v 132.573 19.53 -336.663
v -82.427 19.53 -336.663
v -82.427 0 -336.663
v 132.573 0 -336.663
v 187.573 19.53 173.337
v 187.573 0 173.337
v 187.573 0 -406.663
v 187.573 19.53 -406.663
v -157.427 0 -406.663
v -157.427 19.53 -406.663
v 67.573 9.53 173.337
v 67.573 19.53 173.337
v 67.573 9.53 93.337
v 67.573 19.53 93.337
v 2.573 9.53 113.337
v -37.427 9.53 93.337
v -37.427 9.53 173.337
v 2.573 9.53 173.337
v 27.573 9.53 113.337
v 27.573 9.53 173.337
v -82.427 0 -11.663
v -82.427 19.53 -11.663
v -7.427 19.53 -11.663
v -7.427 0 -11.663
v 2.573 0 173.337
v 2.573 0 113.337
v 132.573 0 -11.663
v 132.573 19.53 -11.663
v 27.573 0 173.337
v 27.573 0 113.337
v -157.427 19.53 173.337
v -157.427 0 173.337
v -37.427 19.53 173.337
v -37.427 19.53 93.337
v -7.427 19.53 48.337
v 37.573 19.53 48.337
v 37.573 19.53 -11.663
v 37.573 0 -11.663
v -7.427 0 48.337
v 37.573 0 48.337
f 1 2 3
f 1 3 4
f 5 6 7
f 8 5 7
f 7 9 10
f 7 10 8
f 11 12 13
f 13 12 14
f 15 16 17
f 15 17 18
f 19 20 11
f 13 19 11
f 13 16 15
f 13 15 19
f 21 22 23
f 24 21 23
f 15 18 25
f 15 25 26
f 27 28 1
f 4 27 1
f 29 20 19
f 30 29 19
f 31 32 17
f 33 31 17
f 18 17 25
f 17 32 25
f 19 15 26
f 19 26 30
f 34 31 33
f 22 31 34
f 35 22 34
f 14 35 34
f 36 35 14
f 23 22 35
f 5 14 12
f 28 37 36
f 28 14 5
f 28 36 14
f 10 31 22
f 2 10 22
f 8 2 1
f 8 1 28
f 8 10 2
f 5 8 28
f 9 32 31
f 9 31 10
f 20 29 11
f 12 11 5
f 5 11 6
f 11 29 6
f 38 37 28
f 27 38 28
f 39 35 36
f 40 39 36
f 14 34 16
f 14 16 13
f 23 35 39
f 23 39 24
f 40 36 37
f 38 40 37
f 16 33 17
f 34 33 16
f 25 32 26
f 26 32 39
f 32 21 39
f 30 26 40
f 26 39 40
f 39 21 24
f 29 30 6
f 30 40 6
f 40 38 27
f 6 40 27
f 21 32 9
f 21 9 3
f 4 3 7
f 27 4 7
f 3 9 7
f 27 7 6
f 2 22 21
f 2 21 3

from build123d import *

# Parameters (mm, degrees)
SKETCH1_W                      = 345
SKETCH1_H                      = 580
BOSS_EXTRUDE1_DEPTH            = 19.53
CUT_EXTRUDE1_REACH             = 450.263
SKETCH2_W                      = 215
SKETCH2_H                      = 325
CUT_EXTRUDE1_DIRECTION_2_DEPTH = 449.2627239
SKETCH3_W                      = 45
SKETCH3_H                      = 60
CUT_EXTRUDE2_DEPTH             = 19.53
SKETCH4_W                      = 105
SKETCH4_H                      = 80
CUT_EXTRUDE3_DEPTH             = 10
SKETCH5_W                      = 25
SKETCH5_H                      = 60
CUT_EXTRUDE4_DEPTH             = 10


with BuildPart() as part:
    # Sketch1 → Boss-Extrude1 (new body)
    with BuildSketch(Plane(origin=(0, 0, 0), x_dir=(1, 0, 0), z_dir=(0, 1, 0))):
        with Locations((15.072815534, 116.662621359)):
            Rectangle(SKETCH1_W, SKETCH1_H)
    extrude(amount=BOSS_EXTRUDE1_DEPTH)

    # Sketch2 → Cut-Extrude1 (cut, up to next)
    with BuildSketch(Plane(origin=(0, 19.53, 0), x_dir=(1, 0, 0), z_dir=(0, 1, 0)), mode=Mode.PRIVATE) as cut_extrude1_sk1:
        with Locations((25.072815534, 174.162621359)):
            Rectangle(SKETCH2_W, SKETCH2_H)
    cut_extrude1_tool1 = extrude(cut_extrude1_sk1.sketch, amount=-CUT_EXTRUDE1_REACH, mode=Mode.PRIVATE) & part.part
    add(cut_extrude1_tool1.solids().sort_by_distance((25.072816, 19.53, -174.162621))[0], mode=Mode.SUBTRACT)

    # Sketch2 → Cut-Extrude1 direction 2 (cut)
    with BuildSketch(Plane(origin=(0, 19.53, 0), x_dir=(1, 0, 0), z_dir=(0, 1, 0))):
        with Locations((25.072815534, 174.162621359)):
            Rectangle(SKETCH2_W, SKETCH2_H)
    extrude(amount=CUT_EXTRUDE1_DIRECTION_2_DEPTH, mode=Mode.SUBTRACT)

    # Sketch3 → Cut-Extrude2 (cut)
    with BuildSketch(Plane(origin=(0, 19.53, 0), x_dir=(1, 0, 0), z_dir=(0, 1, 0))):
        with Locations((15.072815534, -18.337378641)):
            Rectangle(SKETCH3_W, SKETCH3_H)
    extrude(amount=-CUT_EXTRUDE2_DEPTH, mode=Mode.SUBTRACT)

    # Sketch4 → Cut-Extrude3 (cut)
    with BuildSketch(Plane(origin=(0, 19.53, 0), x_dir=(1, 0, 0), z_dir=(0, 1, 0))):
        with Locations((15.072815534, -133.337378641)):
            Rectangle(SKETCH4_W, SKETCH4_H)
    extrude(amount=-CUT_EXTRUDE3_DEPTH, mode=Mode.SUBTRACT)

    # Sketch5 → Cut-Extrude4 (cut)
    with BuildSketch(Plane(origin=(0, 9.53, 0), x_dir=(1, 0, 0), z_dir=(0, 1, 0))):
        with Locations((15.072815534, -143.337378641)):
            Rectangle(SKETCH5_W, SKETCH5_H)
    extrude(amount=-CUT_EXTRUDE4_DEPTH, mode=Mode.SUBTRACT)


solid = part.part
